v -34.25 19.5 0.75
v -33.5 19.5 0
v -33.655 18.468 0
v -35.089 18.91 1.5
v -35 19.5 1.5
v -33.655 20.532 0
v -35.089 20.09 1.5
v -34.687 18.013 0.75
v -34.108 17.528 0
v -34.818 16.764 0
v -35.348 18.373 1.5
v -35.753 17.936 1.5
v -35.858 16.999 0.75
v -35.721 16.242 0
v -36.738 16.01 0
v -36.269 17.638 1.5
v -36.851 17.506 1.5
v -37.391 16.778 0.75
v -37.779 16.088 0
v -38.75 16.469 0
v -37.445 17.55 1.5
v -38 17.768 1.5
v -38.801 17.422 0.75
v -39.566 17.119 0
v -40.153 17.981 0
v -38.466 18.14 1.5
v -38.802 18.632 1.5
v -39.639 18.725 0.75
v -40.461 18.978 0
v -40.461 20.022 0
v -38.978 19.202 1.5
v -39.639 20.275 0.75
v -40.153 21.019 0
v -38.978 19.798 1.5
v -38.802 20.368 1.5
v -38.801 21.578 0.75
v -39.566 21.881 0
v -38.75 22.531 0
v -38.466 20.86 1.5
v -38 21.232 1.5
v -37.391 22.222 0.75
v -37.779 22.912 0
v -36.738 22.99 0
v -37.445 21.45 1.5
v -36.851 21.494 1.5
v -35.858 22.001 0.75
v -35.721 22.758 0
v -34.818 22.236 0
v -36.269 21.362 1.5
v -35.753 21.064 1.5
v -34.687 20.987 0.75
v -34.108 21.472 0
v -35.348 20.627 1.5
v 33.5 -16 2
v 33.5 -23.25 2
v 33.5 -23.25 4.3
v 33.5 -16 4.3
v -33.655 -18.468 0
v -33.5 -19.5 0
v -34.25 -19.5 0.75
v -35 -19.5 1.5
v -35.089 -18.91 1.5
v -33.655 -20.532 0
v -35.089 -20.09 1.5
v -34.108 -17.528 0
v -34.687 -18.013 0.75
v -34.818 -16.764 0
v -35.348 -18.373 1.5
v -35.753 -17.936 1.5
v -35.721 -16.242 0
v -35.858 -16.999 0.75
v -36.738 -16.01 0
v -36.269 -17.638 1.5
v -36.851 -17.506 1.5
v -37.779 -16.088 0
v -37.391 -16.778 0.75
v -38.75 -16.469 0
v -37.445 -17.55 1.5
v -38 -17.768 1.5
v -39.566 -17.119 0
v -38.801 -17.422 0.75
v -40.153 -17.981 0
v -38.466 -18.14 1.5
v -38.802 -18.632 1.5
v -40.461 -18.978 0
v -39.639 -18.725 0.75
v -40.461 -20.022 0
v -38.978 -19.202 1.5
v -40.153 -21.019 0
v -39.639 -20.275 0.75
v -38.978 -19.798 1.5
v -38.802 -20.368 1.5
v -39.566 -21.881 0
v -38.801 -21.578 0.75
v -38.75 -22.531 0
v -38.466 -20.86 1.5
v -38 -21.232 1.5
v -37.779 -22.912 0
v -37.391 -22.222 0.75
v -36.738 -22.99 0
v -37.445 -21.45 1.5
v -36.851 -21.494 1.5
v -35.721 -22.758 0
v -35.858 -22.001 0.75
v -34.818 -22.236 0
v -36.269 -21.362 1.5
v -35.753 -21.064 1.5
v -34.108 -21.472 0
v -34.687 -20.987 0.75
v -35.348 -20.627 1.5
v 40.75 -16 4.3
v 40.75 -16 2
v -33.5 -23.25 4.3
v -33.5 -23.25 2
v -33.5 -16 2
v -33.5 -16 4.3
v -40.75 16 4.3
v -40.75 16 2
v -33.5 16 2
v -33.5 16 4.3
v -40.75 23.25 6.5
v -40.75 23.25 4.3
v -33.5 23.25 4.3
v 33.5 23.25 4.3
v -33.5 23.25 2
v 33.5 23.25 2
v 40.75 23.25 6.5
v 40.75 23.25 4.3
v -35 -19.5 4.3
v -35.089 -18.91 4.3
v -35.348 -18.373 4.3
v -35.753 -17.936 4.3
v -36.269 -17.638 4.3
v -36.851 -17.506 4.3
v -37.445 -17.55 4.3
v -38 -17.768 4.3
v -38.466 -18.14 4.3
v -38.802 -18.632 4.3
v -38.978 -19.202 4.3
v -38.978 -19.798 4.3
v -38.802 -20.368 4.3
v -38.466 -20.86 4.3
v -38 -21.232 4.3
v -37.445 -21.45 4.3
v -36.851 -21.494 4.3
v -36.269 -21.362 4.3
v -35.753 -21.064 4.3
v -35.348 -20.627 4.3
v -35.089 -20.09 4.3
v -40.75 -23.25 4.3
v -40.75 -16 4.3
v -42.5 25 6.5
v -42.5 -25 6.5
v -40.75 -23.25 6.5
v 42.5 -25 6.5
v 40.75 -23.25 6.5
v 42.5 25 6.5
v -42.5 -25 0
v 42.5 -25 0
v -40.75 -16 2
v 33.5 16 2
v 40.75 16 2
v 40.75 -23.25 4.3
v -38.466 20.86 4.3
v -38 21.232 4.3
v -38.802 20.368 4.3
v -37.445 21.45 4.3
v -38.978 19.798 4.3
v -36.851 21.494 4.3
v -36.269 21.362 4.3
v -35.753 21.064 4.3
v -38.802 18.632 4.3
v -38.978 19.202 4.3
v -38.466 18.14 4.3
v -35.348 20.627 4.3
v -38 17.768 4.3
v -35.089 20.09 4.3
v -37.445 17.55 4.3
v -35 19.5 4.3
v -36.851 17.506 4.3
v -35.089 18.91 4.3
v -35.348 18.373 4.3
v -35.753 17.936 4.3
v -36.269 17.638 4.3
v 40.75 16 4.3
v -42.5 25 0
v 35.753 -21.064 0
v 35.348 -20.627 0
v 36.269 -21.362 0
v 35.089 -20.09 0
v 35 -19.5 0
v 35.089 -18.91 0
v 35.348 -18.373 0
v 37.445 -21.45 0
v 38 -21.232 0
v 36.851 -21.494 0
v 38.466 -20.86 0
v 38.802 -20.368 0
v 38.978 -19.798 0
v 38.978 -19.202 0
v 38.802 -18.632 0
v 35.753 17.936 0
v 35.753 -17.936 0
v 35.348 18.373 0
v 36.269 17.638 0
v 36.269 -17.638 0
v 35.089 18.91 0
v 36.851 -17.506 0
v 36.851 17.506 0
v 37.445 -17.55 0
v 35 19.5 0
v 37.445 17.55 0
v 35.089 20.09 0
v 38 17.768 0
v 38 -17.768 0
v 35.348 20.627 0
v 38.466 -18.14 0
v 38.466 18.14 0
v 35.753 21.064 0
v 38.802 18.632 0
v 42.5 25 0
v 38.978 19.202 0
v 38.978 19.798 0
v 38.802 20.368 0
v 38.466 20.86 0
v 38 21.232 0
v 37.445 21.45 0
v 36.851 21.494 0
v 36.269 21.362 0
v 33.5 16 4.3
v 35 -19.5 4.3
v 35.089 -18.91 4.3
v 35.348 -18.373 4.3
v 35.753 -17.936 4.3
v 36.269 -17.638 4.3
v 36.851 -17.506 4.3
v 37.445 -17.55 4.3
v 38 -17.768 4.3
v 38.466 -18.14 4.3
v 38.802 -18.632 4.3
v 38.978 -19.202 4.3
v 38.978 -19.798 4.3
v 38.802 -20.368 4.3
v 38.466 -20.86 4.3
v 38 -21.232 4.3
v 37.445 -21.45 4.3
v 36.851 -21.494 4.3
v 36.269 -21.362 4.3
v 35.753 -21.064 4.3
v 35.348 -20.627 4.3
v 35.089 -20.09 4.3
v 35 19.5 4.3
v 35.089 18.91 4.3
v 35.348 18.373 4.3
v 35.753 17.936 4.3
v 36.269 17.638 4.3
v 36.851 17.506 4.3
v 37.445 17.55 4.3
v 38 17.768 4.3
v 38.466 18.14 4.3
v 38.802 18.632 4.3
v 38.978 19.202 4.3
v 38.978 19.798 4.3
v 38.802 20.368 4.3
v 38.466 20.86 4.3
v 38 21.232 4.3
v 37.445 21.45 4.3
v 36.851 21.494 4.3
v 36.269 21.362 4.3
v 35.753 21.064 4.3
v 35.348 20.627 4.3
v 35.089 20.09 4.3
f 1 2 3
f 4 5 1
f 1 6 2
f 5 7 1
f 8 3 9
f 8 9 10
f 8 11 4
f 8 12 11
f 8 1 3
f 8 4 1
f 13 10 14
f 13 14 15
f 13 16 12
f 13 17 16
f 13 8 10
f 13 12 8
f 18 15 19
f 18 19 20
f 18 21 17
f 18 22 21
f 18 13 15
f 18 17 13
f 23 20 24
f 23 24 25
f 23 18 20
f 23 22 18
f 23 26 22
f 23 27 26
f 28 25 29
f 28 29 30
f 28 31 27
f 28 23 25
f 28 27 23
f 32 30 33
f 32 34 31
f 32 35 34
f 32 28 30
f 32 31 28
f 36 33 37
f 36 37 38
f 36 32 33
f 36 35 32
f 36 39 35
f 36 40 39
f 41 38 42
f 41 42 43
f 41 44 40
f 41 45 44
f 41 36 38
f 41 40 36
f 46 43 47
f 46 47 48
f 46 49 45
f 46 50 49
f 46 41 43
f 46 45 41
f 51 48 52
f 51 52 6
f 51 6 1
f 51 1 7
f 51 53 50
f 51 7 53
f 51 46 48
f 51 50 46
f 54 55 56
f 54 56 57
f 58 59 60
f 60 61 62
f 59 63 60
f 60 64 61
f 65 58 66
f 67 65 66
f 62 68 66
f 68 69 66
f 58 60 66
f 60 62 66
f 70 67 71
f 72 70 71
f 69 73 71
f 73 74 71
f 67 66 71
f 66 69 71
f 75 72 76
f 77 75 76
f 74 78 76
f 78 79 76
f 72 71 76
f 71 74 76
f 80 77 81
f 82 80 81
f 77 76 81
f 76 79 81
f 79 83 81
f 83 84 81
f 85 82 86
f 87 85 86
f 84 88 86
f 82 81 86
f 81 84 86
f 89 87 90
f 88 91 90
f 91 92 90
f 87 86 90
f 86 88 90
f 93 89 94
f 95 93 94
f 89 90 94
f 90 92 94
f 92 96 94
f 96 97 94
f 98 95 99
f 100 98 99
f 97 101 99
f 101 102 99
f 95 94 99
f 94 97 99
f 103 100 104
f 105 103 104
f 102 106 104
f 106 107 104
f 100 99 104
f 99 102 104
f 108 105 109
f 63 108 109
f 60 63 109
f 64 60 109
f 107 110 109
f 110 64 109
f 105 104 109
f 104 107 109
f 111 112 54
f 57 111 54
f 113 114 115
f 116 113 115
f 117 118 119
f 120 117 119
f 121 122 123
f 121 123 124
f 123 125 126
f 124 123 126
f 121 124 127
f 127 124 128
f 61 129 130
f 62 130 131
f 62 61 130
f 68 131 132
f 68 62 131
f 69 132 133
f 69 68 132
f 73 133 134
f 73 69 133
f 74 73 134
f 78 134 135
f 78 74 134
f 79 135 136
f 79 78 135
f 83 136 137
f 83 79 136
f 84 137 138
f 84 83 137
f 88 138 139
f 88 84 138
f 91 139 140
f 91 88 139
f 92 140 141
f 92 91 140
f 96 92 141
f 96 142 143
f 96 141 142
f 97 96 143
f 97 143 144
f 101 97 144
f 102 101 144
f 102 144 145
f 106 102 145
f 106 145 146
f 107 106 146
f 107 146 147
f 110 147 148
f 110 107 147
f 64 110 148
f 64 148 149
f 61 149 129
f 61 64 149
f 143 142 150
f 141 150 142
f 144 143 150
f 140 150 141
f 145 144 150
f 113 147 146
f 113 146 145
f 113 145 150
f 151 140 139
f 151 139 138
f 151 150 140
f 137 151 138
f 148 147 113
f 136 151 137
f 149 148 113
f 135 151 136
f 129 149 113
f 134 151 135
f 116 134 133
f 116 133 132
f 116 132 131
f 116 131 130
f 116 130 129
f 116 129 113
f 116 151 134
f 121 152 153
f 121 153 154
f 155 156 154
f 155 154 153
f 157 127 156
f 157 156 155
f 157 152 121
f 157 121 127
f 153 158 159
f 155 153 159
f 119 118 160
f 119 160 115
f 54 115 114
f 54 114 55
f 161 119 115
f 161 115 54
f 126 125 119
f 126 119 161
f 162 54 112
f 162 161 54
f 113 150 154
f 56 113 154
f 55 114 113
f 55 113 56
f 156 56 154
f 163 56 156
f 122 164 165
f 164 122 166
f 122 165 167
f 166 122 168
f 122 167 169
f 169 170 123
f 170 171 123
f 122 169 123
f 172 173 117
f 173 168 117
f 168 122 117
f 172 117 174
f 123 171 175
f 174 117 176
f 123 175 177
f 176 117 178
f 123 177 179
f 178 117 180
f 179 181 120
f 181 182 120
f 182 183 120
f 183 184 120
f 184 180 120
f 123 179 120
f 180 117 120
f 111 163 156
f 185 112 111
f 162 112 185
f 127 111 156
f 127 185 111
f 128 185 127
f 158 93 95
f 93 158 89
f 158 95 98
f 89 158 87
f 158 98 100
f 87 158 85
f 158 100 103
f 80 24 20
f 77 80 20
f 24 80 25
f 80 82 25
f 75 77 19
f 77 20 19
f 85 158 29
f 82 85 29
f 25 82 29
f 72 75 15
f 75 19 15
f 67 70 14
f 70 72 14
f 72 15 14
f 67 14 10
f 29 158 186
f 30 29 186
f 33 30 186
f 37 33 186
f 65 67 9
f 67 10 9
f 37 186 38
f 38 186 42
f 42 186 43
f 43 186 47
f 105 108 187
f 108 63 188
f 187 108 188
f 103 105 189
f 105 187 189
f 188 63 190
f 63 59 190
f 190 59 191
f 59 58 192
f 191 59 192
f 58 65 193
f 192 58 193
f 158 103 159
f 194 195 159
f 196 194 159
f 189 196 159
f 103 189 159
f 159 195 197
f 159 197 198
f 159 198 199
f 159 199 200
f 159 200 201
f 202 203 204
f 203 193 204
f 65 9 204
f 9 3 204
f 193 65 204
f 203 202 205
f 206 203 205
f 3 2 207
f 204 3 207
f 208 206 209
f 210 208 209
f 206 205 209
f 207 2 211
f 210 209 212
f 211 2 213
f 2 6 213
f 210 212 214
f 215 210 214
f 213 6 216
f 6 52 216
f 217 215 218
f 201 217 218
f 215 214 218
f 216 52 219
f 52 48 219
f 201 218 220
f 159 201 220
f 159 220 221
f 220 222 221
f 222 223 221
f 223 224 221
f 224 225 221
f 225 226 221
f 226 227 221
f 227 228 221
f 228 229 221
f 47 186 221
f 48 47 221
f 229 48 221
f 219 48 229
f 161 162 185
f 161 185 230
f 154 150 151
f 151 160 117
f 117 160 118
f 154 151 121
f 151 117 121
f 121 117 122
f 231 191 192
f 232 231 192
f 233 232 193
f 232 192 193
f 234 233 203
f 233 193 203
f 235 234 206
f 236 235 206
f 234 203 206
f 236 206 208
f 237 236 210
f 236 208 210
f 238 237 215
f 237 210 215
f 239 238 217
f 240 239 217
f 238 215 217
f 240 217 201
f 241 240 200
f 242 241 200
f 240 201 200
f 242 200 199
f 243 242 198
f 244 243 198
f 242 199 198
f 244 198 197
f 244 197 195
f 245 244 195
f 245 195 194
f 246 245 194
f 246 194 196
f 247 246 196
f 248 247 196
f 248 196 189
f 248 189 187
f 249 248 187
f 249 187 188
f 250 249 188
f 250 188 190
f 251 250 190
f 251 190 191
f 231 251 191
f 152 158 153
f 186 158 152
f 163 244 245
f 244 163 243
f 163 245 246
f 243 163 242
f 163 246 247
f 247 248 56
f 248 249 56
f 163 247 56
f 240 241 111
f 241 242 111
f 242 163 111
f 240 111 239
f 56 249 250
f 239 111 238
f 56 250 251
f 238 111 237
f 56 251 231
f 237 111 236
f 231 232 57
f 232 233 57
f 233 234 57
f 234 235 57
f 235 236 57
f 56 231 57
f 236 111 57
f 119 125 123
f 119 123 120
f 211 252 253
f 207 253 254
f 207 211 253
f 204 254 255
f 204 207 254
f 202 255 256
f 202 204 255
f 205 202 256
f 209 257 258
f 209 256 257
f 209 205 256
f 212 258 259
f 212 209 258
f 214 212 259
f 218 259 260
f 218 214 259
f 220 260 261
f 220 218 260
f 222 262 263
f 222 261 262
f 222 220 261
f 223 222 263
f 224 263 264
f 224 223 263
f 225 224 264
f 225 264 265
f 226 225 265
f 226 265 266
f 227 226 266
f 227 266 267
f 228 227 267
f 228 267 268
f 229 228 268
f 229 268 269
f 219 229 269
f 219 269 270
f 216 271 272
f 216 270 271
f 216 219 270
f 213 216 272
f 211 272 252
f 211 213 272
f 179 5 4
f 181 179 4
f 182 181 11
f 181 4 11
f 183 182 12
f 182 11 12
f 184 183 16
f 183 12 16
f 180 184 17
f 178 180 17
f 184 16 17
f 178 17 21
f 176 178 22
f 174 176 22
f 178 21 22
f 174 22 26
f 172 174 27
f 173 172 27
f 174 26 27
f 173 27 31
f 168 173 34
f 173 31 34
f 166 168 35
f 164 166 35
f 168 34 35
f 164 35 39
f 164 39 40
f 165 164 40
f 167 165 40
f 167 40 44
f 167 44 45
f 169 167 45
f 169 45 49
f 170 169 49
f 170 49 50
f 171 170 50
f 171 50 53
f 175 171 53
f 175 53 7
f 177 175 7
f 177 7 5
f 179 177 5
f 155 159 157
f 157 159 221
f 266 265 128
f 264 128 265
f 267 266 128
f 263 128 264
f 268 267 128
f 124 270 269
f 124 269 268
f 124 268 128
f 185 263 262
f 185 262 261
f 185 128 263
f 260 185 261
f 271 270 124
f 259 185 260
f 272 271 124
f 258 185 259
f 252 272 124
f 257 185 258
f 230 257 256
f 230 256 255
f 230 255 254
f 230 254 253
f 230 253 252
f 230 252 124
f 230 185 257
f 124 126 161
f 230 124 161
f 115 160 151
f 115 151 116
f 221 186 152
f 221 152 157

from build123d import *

# Parameters (mm, degrees)
SKETCH007_W                     = 85
SKETCH007_H                     = 50
PAD006_DEPTH                    = 6.5
SKETCH008_W                     = 81.5
SKETCH008_H                     = 46.5
POCKET_DEPTH                    = 4.501
SKETCH010_W                     = 9
SKETCH010_H                     = 9
PAD007_DEPTH                    = 4.3
SKETCH010_MIRRORED002_2_W       = 9
SKETCH010_MIRRORED002_2_H       = 9
PAD007_MIRRORED002_2_DEPTH      = 4.3
CYLINDER001_R                   = 2
CYLINDER001_DEPTH               = 10
CYLINDER001_MIRRORED004_2_R     = 2
CYLINDER001_MIRRORED004_2_DEPTH = 10
SKETCH017_W                     = 4.302639
SKETCH017_H                     = 32
POCKET006_DEPTH                 = 5
CHAMFER_SIZE                    = 1.5


with BuildPart() as part:
    # Sketch007 → Pad006 (new body)
    with BuildSketch(Plane.XY):
        Rectangle(SKETCH007_W, SKETCH007_H)
    extrude(amount=PAD006_DEPTH)

    # Sketch008 → Pocket (cut, through all)
    with BuildSketch(Plane.XY.offset(2)):
        Rectangle(SKETCH008_W, SKETCH008_H)
    extrude(amount=POCKET_DEPTH, mode=Mode.SUBTRACT)

    # Sketch010 → Pad007 (join)
    with BuildSketch(Plane.XY):
        with Locations((-38, -20.5)):
            Rectangle(SKETCH010_W, SKETCH010_H)
    pad007 = extrude(amount=PAD007_DEPTH)

    # Sketch010 Mirrored002 2 → Pad007 Mirrored002 2 (add)
    with BuildSketch(Plane(origin=(0, 0, 0), x_dir=(-1, 0, 0), z_dir=(0, 0, -1))):
        with Locations((-38, -20.5)):
            Rectangle(SKETCH010_MIRRORED002_2_W, SKETCH010_MIRRORED002_2_H)
    pad007_mirrored002_2 = extrude(amount=-PAD007_MIRRORED002_2_DEPTH)

    # Mirrored003: Pad007, Pad007 Mirrored002 2 across Sketch010 H_Axis
    add(pad007.mirror(Plane.ZX))
    add(pad007_mirrored002_2.mirror(Plane.ZX))

    # Cylinder001 → Cylinder001 (cut)
    with BuildSketch(Plane(origin=(-37, -19.5, 0), x_dir=(1, 0, 0), z_dir=(0, 0, 1))):
        Circle(CYLINDER001_R)
    cylinder001 = extrude(amount=CYLINDER001_DEPTH, mode=Mode.SUBTRACT)

    # Cylinder001 Mirrored004 2 → Cylinder001 Mirrored004 2 (cut)
    with BuildSketch(Plane(origin=(37, -19.5, 0), x_dir=(-1, 0, 0), z_dir=(0, 0, -1))):
        Circle(CYLINDER001_MIRRORED004_2_R)
    cylinder001_mirrored004_2 = extrude(amount=-CYLINDER001_MIRRORED004_2_DEPTH, mode=Mode.SUBTRACT)

    # Mirrored005: Cylinder001, Cylinder001 Mirrored004 2 across XZ
    add(cylinder001.mirror(Plane.XZ), mode=Mode.SUBTRACT)
    add(cylinder001_mirrored004_2.mirror(Plane.XZ), mode=Mode.SUBTRACT)

    # Sketch017 → Pocket006 (cut)
    with BuildSketch(Plane.XY.offset(6.5)):
        with Locations((-41.55937, 0)):
            Rectangle(SKETCH017_W, SKETCH017_H)
    extrude(amount=POCKET006_DEPTH, mode=Mode.SUBTRACT)

    # Chamfer
    chamfer_edges = [part.edges().sort_by_distance(p)[0] for p in [
        (-39, -19.5, 0),
        (-39, 19.5, 0),
    ]]
    chamfer(chamfer_edges, length=CHAMFER_SIZE)


solid = part.part
